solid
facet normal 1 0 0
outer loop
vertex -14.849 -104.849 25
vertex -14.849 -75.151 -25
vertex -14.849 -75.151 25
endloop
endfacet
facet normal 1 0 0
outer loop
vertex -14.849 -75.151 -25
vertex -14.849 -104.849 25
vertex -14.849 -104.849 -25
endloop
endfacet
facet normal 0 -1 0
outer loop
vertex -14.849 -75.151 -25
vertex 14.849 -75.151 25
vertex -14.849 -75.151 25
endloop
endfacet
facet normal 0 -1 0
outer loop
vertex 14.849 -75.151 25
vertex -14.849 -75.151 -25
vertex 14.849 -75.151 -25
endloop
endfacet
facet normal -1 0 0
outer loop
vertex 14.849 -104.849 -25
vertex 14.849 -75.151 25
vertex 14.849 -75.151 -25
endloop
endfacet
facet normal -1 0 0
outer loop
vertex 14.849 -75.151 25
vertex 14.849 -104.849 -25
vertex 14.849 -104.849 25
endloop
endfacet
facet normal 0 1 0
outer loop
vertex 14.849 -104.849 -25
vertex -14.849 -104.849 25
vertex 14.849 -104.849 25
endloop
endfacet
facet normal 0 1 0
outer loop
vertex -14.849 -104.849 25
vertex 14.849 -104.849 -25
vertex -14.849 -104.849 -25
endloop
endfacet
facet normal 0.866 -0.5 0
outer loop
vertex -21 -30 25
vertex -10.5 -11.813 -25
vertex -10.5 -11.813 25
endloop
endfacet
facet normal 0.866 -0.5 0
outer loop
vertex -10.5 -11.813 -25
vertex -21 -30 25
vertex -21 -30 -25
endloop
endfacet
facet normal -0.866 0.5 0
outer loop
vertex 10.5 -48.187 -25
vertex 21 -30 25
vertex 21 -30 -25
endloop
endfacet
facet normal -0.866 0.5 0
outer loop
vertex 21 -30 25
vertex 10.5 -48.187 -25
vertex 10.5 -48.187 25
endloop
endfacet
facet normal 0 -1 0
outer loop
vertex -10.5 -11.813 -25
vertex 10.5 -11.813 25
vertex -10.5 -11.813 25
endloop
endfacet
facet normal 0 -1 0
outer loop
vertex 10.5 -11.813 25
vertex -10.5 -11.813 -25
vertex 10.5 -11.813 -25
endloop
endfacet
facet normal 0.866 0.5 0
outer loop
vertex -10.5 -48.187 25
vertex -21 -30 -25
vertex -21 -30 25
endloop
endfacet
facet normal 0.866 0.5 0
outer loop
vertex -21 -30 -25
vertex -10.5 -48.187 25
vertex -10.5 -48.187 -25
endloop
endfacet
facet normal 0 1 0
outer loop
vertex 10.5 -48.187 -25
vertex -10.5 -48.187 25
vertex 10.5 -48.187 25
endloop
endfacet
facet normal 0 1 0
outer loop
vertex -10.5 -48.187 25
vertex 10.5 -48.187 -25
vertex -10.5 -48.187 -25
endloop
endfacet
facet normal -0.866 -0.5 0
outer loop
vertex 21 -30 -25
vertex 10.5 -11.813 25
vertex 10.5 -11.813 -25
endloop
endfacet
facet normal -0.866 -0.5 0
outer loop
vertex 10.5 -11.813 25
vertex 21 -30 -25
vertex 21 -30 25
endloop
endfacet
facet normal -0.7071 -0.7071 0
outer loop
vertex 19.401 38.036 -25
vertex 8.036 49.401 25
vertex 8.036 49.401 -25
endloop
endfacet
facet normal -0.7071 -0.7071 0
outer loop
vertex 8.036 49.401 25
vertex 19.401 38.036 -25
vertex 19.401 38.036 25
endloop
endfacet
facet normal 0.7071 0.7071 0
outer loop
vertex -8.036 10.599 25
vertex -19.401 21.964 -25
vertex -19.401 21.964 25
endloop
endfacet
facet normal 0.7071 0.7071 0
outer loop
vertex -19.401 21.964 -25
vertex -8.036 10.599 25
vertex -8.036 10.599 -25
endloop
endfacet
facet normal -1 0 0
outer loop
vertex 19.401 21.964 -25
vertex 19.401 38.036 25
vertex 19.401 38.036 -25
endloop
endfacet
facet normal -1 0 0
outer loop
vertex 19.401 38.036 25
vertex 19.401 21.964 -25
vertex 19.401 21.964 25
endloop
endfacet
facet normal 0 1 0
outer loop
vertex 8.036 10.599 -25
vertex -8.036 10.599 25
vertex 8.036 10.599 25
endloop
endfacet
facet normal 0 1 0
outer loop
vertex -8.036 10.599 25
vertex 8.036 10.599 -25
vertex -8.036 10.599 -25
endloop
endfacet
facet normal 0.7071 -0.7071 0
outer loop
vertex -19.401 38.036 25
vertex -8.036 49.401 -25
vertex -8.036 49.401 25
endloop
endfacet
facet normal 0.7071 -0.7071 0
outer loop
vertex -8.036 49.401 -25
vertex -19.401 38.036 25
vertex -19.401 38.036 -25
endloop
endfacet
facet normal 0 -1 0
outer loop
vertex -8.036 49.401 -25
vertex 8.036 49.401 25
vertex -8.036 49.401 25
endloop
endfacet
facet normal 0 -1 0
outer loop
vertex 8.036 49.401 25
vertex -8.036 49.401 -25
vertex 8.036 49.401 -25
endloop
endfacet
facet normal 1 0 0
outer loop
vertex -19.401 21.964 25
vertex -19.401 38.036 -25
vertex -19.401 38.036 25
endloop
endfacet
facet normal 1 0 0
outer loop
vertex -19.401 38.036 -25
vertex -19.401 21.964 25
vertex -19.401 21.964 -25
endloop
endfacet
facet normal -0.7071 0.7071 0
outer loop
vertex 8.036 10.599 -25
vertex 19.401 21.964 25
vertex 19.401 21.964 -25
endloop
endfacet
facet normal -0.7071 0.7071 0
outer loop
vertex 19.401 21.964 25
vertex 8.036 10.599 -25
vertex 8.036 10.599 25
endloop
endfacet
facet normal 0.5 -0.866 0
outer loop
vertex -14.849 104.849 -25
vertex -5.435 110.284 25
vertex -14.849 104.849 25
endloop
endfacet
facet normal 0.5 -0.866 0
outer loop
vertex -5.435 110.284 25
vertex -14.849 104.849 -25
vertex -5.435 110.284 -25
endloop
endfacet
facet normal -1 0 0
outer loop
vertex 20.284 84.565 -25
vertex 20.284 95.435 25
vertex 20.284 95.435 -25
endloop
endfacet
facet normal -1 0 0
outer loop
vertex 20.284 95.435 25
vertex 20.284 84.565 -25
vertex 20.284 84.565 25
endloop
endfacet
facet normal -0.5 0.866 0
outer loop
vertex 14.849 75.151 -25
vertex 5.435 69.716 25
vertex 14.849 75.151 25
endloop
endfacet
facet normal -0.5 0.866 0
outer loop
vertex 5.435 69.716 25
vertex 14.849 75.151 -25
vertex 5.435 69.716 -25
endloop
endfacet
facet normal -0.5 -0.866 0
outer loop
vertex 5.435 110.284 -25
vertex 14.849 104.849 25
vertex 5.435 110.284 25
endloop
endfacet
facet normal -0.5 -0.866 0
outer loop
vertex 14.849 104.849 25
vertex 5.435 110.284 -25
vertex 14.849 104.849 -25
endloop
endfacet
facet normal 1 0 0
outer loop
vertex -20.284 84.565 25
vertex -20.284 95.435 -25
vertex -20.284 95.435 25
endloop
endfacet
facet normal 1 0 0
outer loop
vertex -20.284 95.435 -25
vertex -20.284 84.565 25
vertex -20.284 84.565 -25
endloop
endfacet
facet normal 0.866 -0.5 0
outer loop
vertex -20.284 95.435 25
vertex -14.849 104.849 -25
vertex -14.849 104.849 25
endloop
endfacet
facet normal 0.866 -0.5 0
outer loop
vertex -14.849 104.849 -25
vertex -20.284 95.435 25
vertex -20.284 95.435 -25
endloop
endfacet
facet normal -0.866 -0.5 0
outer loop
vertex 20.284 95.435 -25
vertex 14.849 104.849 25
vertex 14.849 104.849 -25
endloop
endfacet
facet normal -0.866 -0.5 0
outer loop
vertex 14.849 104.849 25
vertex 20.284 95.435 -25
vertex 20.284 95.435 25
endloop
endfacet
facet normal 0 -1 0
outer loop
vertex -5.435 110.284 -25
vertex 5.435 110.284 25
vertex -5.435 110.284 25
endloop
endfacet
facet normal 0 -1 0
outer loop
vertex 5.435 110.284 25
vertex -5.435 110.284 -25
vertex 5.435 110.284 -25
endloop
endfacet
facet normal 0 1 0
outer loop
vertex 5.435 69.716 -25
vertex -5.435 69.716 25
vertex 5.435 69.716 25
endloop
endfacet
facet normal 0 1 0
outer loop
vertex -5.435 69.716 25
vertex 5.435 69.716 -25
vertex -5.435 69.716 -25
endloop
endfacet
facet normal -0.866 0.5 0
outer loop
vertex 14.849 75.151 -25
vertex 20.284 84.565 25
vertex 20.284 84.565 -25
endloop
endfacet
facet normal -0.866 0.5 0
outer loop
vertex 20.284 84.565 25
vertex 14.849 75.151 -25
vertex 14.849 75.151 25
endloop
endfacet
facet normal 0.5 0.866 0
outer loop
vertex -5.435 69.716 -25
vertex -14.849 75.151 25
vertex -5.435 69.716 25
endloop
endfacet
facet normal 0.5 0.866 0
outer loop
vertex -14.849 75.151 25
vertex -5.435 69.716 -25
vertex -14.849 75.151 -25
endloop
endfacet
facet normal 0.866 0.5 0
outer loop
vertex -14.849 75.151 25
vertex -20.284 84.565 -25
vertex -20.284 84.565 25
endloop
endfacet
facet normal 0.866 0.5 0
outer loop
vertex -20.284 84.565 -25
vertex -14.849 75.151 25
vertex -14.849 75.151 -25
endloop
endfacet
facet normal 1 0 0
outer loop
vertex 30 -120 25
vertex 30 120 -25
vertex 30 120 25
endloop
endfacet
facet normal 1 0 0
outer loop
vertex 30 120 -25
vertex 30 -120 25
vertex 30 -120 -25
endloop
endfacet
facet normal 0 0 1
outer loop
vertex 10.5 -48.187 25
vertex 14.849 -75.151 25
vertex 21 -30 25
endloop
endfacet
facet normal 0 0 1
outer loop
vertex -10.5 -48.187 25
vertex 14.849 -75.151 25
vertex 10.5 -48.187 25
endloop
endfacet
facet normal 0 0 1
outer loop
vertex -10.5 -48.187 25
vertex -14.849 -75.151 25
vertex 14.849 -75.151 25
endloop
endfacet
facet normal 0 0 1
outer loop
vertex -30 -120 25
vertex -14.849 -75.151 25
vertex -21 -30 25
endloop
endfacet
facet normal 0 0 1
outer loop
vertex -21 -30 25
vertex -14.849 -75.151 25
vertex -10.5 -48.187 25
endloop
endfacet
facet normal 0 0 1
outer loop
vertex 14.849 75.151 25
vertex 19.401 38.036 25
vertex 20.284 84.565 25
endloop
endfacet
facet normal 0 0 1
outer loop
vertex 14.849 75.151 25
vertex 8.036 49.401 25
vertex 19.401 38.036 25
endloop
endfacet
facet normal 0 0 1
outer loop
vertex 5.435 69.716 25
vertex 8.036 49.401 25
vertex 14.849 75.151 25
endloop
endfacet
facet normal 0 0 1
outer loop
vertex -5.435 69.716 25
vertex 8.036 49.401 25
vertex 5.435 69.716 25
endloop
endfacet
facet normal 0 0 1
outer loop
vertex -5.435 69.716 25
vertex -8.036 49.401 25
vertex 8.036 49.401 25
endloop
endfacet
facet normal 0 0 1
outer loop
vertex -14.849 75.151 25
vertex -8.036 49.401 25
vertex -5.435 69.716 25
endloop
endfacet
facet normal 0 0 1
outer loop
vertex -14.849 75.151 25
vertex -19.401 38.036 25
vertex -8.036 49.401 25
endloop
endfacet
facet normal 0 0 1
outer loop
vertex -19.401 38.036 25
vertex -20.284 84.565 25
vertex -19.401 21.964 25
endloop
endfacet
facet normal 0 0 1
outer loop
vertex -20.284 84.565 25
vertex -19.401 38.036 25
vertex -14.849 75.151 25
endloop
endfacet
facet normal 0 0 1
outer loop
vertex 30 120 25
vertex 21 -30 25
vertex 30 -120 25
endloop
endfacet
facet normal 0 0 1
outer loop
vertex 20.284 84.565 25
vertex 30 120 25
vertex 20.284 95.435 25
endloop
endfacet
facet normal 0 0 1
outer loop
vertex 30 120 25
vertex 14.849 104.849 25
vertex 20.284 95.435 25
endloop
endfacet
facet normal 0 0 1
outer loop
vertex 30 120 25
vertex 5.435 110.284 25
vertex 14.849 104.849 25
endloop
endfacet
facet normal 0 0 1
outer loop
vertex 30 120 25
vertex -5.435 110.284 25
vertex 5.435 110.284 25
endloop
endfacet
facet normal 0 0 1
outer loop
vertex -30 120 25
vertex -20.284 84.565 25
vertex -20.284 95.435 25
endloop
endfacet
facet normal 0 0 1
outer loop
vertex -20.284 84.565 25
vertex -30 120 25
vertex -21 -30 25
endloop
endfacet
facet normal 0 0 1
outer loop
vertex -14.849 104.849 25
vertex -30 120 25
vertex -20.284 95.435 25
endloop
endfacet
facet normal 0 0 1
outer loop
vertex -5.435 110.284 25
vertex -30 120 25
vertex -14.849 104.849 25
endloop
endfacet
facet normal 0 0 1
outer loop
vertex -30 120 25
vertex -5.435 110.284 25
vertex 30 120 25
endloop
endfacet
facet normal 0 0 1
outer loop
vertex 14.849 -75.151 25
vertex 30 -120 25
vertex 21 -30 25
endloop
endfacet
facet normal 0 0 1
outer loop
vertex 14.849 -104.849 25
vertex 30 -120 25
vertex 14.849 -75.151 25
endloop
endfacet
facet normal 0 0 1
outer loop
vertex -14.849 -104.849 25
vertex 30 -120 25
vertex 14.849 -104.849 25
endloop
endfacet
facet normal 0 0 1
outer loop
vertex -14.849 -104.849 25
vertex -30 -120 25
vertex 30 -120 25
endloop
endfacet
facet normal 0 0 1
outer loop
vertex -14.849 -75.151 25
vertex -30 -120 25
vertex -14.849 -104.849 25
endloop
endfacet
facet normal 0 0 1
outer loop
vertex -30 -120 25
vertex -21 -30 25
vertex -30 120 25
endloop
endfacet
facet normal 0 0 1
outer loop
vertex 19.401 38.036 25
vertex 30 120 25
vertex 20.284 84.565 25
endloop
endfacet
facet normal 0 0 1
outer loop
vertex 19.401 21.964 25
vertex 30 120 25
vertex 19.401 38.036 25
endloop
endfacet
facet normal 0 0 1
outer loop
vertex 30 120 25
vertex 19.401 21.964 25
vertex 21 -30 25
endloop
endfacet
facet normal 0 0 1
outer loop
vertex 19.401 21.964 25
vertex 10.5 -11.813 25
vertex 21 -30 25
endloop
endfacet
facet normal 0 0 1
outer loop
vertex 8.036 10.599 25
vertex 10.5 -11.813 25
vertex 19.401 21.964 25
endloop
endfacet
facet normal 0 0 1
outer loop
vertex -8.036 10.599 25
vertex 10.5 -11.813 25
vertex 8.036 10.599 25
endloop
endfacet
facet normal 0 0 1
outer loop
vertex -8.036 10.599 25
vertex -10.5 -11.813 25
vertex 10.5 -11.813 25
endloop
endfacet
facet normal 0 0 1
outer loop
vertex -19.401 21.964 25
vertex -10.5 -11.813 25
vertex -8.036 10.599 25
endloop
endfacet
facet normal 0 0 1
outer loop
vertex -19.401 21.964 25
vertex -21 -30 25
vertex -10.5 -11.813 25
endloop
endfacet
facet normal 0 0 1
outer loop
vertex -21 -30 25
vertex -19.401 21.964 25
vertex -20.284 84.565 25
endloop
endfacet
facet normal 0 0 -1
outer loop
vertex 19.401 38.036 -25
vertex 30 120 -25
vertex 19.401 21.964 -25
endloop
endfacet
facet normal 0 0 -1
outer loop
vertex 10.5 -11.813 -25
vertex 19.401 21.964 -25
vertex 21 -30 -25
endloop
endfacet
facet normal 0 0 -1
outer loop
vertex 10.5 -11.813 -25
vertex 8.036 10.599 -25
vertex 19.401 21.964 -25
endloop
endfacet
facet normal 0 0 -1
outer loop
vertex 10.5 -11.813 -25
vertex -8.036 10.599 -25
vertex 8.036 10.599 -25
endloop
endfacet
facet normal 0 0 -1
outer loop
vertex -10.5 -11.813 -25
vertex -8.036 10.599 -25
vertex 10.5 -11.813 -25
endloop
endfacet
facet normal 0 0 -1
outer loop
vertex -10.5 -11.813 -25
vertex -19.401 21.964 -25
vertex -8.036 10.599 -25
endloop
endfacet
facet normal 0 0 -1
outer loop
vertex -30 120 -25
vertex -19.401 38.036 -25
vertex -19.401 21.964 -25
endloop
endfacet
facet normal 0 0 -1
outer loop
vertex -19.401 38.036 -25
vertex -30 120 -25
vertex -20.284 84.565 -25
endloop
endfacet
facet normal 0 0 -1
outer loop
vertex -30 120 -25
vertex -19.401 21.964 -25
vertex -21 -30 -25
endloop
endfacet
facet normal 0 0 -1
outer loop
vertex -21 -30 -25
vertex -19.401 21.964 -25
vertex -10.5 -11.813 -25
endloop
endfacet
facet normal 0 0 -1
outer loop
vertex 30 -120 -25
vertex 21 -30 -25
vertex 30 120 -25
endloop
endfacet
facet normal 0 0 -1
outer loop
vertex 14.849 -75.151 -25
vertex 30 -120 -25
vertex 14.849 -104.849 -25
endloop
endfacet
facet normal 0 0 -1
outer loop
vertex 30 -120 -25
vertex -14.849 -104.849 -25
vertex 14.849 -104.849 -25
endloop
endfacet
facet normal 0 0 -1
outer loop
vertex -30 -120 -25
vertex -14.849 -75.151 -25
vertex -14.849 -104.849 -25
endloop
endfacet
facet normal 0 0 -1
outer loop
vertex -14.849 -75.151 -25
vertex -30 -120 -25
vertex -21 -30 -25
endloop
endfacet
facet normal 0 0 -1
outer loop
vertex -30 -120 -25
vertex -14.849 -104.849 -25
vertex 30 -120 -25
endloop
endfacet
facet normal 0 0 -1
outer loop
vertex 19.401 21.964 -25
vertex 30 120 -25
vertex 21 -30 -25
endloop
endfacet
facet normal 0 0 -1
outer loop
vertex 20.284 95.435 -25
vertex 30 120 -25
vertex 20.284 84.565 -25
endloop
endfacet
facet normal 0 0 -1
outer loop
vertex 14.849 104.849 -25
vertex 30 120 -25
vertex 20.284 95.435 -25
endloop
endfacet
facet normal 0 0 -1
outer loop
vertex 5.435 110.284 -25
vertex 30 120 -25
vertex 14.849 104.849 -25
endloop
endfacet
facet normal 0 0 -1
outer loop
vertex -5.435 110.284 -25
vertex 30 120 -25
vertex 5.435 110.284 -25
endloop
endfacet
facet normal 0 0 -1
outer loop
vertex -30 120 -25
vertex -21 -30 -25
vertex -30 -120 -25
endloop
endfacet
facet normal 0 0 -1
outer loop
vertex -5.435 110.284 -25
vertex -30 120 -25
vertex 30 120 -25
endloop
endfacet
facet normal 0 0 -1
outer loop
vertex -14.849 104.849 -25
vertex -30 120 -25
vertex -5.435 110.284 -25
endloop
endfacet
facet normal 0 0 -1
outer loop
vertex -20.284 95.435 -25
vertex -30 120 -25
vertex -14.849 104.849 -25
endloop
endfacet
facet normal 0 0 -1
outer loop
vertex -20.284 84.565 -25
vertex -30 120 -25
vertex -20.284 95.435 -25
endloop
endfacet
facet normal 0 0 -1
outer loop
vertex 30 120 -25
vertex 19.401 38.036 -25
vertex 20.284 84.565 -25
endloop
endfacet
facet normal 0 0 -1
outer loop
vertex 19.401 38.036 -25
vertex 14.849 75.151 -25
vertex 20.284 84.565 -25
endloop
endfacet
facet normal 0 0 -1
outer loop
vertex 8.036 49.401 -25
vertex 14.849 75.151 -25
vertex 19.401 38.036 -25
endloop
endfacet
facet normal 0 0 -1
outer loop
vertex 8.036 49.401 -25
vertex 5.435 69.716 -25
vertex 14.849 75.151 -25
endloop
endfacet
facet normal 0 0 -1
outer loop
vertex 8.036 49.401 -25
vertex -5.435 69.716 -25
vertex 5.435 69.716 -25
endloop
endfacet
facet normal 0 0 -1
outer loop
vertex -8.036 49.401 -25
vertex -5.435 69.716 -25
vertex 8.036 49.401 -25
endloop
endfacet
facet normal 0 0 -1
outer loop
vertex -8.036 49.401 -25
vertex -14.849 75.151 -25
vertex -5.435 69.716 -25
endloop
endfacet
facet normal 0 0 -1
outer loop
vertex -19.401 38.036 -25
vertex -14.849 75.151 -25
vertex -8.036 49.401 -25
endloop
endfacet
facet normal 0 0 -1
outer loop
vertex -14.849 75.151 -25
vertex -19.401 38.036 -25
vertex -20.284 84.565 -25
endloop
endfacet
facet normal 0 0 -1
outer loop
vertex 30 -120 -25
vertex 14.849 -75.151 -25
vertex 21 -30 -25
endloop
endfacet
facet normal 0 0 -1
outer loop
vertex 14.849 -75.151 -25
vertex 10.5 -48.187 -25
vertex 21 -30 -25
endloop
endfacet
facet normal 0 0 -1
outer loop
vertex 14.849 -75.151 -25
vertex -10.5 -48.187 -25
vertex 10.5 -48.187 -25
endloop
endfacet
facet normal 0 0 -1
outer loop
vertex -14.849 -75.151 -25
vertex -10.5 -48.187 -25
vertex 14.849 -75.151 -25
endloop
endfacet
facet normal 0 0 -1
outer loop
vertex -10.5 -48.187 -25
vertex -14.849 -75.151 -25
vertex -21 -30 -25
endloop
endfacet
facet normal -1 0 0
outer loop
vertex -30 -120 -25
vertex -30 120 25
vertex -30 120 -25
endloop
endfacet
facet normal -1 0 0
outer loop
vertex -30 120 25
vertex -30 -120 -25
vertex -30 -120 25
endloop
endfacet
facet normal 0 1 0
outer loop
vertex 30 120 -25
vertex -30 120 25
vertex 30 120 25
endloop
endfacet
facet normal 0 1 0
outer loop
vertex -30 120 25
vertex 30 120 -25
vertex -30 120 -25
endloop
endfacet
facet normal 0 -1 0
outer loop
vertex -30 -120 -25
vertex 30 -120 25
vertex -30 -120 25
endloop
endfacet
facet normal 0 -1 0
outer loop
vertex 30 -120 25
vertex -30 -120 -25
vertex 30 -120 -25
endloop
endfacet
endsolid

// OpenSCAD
// file: libpeginhole.scad
/*
 *  Copyright 2024 AGH Center of Excellence in Artificial Intelligence
 *
 *  Licensed under the Apache License, Version 2.0 (the "License");
 *  you may not use this file except in compliance with the License.
 *  You may obtain a copy of the License at
 *
 *      http://www.apache.org/licenses/LICENSE-2.0
 *
 *  Unless required by applicable law or agreed to in writing, software
 *  distributed under the License is distributed on an "AS IS" BASIS,
 *  WITHOUT WARRANTIES OR CONDITIONS OF ANY KIND, either express or implied.
 *  See the License for the specific language governing permissions and
 *  limitations under the License.
 */
EPS = 0.001;

function circle_coordinate(x, r, p) = [ r * cos(x + p), r * sin(x + p) ];
function regular_shape_vertices(n = 3, r = 1, phase = 0) = [for (t = [0:360 / n:360 - EPS]) circle_coordinate(t, r, phase)];

/* Makes a single peg in form of regular prism
-  Args:
- @vertices: int - number of the base polygon vertices
- @diameter: num - the diameter of the circle to construct the verticies
- @height: num - the height of the prism
- @angle_offset: num - rotation of all verticies
- @is_cylinder: bool - flag to convert prism into cylinder
*/
module regular_prism(vertices, diameter, height, angle_offset, is_cylinder = false)
{
	if (is_cylinder)
	{
		cylinder(h = height, r = diameter / 2, center = true);
	}
	else if (vertices < 3)
	{
		echo("ERROR: Can't construct polygon with less than 3 vertices!");
	}
	else
	{
		linear_extrude(height = height, center = true)
		{
			if (vertices == 4)
			{
				square(diameter / sqrt(2), center = true);
			}
			else
			{
				points = regular_shape_vertices(n = vertices, r = diameter / 2, phase = angle_offset);
				polygon(points);
			}
		}
	}
}

/* Makes a single peghole
-  Args:
- @slot_size: num - the side of the box
- @depth: num - the thickness of the surface for insertion
- @height: num - the height of the whole box
- @leg_width: num - the side of the supporting legs
*/
module single_insertion_box(slot_size, depth, height, leg_width)
{
	difference()
	{
		// Insertion surface
		cube([ slot_size, slot_size, height ], center = true);

		// Clearance (4 legs)
		translate([ 0, 0, -depth ])
		cube([ slot_size + EPS, slot_size - 2 * leg_width, height ], center = true);
		translate([ 0, 0, -depth ])
		cube([ slot_size - 2 * leg_width, slot_size + EPS, height ], center = true);

		// Peghole
		children(0);
	}
}

/* Makes multiple pegholes
-  Args:
- @slot_size: num - the side of the box
- @array_size: vec[int, int] - array dimensions of the holes grid
- @depth: num - the thickness of the surface for insertion
- @height: num - the height of the whole box
- @leg_width: num - the side of the supporting legs
*/
module multiple_insertion_box(slot_size, array_size, depth, height, leg_width)
{
	box_dims = slot_size * array_size;
	difference()
	{
		// Insertion surface
		cube([ box_dims.x, box_dims.y, height ], center = true);

		// Clearance (4 legs)
		translate([ 0, 0, -depth ])
		cube([ box_dims.x + EPS, box_dims.y - 2 * leg_width, height ], center = true);
		translate([ 0, 0, -depth ])
		cube([ box_dims.x - 2 * leg_width, box_dims.y + EPS, height ], center = true);

		// Pegholes array
		array_offset = -box_dims / 2 + [ slot_size, slot_size ] / 2;
		for (cnt_y = [0:1:array_size.y - EPS])
		{
			for (cnt_x = [0:1:array_size.x - EPS])
			{
				dx = slot_size * cnt_x;
				dy = slot_size * cnt_y;
				child_idx = ((cnt_y * array_size.x) + cnt_x) % $children;

				translate([ array_offset.x + dx, array_offset.y + dy, 0 ])
				children(child_idx);
			}
		}
	}
}
// main file
/*
 *  Copyright 2024 AGH Center of Excellence in Artificial Intelligence
 *
 *  Licensed under the Apache License, Version 2.0 (the "License");
 *  you may not use this file except in compliance with the License.
 *  You may obtain a copy of the License at
 *
 *      http://www.apache.org/licenses/LICENSE-2.0
 *
 *  Unless required by applicable law or agreed to in writing, software
 *  distributed under the License is distributed on an "AS IS" BASIS,
 *  WITHOUT WARRANTIES OR CONDITIONS OF ANY KIND, either express or implied.
 *  See the License for the specific language governing permissions and
 *  limitations under the License.
 */
use <libpeginhole.scad>
$fa = 1;
$fs = 0.4;

// Holes array
rotation = [ 0, 0, 0 ]; // in degs
array_x = 1;
array_y = 4;
box_height = 50;
depth = box_height / 2;
prism_diameter = 40;
slot_size = 1.5 * prism_diameter;
leg_width = 2 * slot_size;
tolerance = 1.0;

_hole_diameter = 2 * tolerance + prism_diameter;

rotate(rotation)
multiple_insertion_box(slot_size = slot_size, array_size = [ array_x, array_y ], depth = box_height / 2,
                       height = box_height, leg_width = 2 * slot_size)
{
	regular_prism(vertices = 4, diameter = _hole_diameter, height = 100, angle_offset = 0);
	regular_prism(vertices = 6, diameter = _hole_diameter, height = 100, angle_offset = 0);
	regular_prism(vertices = 8, diameter = _hole_diameter, height = 100, angle_offset = 22.5);
	regular_prism(vertices = 12, diameter = _hole_diameter, height = 100, angle_offset = 15);
};
